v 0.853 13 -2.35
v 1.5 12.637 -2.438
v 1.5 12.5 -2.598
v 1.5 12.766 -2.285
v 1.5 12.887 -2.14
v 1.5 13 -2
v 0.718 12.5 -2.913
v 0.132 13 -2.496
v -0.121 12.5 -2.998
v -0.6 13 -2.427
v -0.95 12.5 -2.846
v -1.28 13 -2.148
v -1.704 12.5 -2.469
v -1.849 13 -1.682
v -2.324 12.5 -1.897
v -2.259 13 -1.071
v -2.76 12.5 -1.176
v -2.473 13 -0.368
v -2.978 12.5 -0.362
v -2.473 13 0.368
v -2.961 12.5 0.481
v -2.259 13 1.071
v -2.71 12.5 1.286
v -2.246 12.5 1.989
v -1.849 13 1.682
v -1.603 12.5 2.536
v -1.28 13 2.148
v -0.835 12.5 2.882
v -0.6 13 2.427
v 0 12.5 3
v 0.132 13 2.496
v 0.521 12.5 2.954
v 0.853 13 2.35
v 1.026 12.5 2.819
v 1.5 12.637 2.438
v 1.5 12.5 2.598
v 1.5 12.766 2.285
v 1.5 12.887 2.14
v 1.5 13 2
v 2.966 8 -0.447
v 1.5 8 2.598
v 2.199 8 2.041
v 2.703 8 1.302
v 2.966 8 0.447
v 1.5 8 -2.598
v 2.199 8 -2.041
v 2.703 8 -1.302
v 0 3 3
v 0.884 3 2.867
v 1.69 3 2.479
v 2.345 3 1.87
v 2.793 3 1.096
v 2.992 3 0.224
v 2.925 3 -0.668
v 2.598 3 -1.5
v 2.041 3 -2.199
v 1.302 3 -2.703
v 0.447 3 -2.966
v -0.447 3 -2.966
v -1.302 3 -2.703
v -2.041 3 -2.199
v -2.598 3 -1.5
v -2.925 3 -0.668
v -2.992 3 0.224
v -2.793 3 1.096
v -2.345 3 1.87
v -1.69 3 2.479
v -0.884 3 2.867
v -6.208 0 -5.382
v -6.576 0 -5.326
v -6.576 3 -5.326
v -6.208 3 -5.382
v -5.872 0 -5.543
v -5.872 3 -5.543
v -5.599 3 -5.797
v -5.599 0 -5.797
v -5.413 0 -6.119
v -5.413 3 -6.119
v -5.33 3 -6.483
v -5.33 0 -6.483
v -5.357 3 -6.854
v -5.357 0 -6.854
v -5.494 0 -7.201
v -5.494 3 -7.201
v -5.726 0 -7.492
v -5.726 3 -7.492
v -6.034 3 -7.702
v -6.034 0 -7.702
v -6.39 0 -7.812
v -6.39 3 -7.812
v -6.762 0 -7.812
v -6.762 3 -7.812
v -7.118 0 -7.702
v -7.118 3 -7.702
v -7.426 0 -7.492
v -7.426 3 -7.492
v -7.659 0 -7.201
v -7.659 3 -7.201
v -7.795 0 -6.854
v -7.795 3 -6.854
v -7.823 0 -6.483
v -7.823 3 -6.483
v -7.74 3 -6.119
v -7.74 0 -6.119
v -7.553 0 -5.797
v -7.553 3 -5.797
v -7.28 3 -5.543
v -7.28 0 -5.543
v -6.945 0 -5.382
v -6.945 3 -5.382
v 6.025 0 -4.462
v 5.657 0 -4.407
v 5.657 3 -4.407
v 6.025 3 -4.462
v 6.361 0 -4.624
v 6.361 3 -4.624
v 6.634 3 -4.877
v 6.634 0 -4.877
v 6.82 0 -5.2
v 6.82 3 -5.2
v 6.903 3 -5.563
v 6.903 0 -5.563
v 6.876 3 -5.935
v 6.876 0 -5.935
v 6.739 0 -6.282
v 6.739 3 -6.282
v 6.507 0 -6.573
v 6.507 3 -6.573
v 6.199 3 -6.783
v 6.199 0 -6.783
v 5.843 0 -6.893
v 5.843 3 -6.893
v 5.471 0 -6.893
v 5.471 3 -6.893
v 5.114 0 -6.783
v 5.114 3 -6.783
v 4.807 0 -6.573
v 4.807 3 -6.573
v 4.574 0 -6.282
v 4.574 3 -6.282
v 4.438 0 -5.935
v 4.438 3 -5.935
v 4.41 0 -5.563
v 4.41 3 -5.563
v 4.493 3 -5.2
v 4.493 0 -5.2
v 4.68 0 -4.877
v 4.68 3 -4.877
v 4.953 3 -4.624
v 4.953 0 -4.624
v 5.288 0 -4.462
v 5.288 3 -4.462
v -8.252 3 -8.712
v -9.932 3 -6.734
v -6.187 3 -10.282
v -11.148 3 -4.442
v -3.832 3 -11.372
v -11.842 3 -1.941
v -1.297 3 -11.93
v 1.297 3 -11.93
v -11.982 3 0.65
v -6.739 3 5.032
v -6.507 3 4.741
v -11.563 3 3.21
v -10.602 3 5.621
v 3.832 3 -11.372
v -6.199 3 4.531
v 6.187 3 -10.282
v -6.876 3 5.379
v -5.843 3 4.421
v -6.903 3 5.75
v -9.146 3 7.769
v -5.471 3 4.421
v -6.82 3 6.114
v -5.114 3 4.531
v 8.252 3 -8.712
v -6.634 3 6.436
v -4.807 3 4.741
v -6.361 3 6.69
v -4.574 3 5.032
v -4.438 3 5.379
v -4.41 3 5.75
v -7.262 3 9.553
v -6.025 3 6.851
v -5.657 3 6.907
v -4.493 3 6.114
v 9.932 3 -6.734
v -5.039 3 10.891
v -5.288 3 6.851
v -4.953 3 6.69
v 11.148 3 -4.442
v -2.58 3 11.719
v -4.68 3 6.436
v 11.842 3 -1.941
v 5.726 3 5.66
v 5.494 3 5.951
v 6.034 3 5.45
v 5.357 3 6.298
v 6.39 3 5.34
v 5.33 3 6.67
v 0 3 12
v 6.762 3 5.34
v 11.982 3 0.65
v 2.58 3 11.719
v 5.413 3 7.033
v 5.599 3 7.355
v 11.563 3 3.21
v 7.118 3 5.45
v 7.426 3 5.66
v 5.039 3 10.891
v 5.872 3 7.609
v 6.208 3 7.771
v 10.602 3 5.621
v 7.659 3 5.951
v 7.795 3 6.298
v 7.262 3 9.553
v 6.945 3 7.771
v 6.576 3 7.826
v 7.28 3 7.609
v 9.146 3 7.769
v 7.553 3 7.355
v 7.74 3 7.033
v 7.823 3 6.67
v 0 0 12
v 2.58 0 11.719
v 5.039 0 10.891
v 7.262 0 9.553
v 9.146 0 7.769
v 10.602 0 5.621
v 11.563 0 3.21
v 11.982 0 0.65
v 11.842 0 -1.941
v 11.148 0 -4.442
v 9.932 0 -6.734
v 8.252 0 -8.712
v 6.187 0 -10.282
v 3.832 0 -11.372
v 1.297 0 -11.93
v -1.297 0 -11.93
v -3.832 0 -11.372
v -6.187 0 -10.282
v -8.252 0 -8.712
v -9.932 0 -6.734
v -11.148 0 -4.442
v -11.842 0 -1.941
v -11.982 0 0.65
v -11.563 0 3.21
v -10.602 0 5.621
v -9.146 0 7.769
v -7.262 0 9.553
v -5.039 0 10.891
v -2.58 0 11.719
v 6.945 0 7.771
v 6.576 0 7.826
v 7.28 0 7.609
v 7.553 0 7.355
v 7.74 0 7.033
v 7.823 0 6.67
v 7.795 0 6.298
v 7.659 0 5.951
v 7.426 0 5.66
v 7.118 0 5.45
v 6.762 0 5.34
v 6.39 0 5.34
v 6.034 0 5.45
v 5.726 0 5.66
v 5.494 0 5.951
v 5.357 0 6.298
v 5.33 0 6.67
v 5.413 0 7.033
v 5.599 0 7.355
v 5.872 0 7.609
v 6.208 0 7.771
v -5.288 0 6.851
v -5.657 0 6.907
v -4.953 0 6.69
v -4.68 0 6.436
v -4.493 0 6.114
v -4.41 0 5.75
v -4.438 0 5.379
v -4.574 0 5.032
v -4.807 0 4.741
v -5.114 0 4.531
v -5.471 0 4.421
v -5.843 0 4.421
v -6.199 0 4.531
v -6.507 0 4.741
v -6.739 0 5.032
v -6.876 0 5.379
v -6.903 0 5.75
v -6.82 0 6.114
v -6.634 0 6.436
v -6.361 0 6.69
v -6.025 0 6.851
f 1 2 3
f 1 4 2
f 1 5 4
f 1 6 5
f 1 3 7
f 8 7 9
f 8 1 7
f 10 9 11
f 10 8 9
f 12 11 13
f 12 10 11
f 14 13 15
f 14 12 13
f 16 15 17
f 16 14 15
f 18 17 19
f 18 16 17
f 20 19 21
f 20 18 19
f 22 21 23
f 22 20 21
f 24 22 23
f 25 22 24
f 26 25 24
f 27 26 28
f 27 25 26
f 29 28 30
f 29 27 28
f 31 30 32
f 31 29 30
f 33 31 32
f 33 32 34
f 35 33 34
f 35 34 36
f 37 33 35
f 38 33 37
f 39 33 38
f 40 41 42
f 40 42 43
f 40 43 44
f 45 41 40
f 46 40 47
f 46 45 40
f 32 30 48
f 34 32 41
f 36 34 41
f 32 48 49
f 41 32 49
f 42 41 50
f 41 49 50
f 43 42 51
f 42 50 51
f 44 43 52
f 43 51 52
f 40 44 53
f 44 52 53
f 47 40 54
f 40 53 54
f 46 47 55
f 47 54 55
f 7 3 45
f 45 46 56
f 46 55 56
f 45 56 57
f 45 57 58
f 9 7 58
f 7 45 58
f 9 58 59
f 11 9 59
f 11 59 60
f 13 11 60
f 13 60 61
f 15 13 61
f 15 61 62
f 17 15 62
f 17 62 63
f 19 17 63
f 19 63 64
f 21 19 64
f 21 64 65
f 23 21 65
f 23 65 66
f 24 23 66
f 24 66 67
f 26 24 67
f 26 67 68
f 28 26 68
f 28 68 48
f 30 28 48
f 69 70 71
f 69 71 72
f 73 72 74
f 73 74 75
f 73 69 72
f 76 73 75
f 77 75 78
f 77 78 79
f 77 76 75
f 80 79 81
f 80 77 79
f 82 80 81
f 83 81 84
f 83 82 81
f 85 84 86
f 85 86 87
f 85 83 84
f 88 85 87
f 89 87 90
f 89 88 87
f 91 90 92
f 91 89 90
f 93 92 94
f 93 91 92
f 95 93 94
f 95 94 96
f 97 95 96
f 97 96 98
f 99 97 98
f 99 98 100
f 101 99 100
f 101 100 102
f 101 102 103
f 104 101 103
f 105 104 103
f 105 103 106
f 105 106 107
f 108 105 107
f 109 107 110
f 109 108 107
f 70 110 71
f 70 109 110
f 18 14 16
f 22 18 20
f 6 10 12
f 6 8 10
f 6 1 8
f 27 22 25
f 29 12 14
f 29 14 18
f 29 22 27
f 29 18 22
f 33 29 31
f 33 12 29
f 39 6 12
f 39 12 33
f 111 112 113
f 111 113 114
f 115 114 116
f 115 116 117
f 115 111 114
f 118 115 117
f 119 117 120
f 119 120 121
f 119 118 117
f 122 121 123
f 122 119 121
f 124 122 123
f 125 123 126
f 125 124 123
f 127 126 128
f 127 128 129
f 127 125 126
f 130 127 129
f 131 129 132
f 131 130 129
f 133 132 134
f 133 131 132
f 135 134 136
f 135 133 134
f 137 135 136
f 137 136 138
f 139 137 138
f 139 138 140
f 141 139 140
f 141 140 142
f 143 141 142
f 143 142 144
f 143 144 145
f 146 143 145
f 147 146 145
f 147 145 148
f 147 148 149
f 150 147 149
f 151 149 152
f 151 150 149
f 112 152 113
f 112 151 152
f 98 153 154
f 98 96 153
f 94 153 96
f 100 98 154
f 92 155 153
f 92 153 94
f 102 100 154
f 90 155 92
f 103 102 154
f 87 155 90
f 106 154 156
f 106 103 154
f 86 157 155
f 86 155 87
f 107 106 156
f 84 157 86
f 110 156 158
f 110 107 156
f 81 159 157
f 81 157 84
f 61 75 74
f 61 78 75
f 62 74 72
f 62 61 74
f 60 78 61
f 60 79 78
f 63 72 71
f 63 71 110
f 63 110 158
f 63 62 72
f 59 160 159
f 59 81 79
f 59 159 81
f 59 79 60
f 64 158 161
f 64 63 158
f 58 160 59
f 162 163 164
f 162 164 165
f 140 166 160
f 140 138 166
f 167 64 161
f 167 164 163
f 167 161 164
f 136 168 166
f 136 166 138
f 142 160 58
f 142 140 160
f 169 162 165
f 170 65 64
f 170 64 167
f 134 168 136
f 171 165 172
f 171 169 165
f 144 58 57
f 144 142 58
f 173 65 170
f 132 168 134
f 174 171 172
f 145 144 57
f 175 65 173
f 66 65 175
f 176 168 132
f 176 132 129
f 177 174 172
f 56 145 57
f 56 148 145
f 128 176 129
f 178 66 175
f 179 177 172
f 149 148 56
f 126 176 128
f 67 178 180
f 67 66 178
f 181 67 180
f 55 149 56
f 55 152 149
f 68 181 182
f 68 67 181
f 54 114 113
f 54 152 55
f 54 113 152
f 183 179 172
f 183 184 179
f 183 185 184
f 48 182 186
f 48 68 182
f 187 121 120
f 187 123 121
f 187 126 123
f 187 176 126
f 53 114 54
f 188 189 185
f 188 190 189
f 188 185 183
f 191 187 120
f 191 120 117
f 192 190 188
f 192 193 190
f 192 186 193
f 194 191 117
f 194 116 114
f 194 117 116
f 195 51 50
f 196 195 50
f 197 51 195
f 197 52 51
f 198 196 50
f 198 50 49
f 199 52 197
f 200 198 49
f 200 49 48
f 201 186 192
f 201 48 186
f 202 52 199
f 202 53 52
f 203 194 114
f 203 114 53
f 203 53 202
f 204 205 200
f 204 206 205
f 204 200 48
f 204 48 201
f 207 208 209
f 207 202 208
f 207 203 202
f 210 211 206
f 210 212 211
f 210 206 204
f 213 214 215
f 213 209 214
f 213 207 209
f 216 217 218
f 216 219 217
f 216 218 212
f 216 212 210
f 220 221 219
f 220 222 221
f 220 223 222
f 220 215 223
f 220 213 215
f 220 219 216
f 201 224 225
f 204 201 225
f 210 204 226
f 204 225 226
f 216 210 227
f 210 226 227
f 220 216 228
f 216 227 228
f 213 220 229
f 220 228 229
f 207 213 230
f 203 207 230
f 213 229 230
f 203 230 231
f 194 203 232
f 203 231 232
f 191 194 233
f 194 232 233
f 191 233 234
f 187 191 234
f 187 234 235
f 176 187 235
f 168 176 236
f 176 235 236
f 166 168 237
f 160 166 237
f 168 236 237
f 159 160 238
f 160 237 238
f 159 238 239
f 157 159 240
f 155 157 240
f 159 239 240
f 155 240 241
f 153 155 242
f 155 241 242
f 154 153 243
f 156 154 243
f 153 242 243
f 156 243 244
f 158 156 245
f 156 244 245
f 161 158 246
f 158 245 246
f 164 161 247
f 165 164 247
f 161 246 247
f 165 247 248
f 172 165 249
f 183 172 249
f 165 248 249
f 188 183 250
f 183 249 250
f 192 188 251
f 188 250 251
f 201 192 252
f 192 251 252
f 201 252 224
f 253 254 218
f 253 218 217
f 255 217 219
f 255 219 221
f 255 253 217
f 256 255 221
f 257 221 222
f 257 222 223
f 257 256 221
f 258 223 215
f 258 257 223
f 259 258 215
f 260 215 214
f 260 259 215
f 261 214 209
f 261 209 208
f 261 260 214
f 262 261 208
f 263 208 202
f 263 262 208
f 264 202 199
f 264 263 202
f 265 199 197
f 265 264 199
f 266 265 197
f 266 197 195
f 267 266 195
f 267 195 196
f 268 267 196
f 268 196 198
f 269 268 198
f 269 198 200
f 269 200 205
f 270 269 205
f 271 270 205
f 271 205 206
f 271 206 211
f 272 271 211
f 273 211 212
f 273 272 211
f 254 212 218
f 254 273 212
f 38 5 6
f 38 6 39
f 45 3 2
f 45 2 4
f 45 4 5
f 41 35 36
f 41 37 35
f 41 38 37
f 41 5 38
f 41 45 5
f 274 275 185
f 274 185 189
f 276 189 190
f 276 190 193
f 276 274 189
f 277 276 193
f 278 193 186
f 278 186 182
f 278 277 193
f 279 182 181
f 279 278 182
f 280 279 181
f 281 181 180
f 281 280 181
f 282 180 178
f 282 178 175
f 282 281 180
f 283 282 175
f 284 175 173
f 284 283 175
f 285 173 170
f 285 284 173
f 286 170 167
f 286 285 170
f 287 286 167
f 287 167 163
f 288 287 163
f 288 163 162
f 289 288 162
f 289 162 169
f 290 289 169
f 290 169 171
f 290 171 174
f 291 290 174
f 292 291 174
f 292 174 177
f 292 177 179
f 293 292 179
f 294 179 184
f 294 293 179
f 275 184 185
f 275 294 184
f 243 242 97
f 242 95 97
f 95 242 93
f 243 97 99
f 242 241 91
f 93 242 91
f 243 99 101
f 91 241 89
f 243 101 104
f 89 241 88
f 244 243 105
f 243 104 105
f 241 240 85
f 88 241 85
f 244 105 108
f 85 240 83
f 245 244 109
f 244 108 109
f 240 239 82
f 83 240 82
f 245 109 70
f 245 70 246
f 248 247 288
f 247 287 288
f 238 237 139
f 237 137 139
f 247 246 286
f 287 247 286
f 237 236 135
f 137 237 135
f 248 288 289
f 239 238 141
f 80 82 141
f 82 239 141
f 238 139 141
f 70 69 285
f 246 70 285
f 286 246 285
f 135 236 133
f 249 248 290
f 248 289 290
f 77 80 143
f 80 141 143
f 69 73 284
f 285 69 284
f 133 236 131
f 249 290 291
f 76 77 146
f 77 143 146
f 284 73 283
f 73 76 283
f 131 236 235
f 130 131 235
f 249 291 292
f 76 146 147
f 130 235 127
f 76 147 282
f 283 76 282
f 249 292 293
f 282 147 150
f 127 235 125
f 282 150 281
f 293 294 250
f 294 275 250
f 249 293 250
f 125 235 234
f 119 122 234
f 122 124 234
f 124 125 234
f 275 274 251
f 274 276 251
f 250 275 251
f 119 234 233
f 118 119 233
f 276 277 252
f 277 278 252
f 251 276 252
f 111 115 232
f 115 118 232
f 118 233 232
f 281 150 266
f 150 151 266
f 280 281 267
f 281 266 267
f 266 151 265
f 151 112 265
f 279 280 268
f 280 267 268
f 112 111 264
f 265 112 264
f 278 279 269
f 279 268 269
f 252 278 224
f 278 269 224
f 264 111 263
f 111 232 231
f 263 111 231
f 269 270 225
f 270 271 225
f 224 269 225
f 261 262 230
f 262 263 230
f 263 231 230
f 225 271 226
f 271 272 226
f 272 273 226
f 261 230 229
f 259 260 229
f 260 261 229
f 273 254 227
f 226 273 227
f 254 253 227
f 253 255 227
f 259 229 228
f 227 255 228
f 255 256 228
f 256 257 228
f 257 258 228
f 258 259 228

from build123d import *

# Parameters (mm, degrees)
CROQUIS1_R              = 12
CROQUIS1_R_2            = 1.25
SALIENTE_EXTRUIR1_DEPTH = 3
SALIENTE_EXTRUIR2_START = 3
CROQUIS1_3_R            = 3
SALIENTE_EXTRUIR2_DEPTH = 10
CORTAR_EXTRUIR1_START   = -5
CORTAR_EXTRUIR1_DEPTH   = 5
CHAFL_N1_SIZE           = 0.5


with BuildPart() as part:
    # Croquis1 → Saliente-Extruir1 (new body)
    with BuildSketch(Plane(origin=(0, 0, 0), x_dir=(1, 0, 0), z_dir=(0, 1, 0))):
        with Locations(Location((0, 0, 0), (0, 0, 270))):
            Circle(CROQUIS1_R)
        with Locations(Location((-6.576093065, 6.576093065, 0), (0, 0, 270))):
            Circle(CROQUIS1_R_2, mode=Mode.SUBTRACT)
        with Locations(Location((5.656854249, 5.656854249, 0), (0, 0, 270))):
            Circle(CROQUIS1_R_2, mode=Mode.SUBTRACT)
        with Locations(Location((6.576093065, -6.576093065, 0), (0, 0, 270))):
            Circle(CROQUIS1_R_2, mode=Mode.SUBTRACT)
        with Locations(Location((-5.656854249, -5.656854249, 0), (0, 0, 270))):
            Circle(CROQUIS1_R_2, mode=Mode.SUBTRACT)
    extrude(amount=SALIENTE_EXTRUIR1_DEPTH)

    # Croquis1<3> → Saliente-Extruir2 (add)
    with BuildSketch(Plane(origin=(0, 0, 0), x_dir=(1, 0, 0), z_dir=(0, 1, 0)).offset(SALIENTE_EXTRUIR2_START)):
        with Locations(Location((0, 0, 0), (0, 0, 270))):
            Circle(CROQUIS1_3_R)
    extrude(amount=SALIENTE_EXTRUIR2_DEPTH)

    # Croquis2 → Cortar-Extruir1 (cut)
    with BuildSketch(Plane(origin=(0, 13, 0), x_dir=(1, 0, 0), z_dir=(0, 1, 0)).offset(CORTAR_EXTRUIR1_START)):
        with BuildLine():
            Line((1.5, 2.598076211), (1.5, -2.598076211))
            ThreePointArc((1.5, -2.598076211), (3, 0), (1.5, 2.598076211))
        make_face()
    extrude(amount=CORTAR_EXTRUIR1_DEPTH, mode=Mode.SUBTRACT)

    # Chaflán1
    chafl_n1_edges = [part.edges().sort_by_distance(p)[0] for p in [
        (-2.897777479, 13, -0.776457135),
    ]]
    chamfer(chafl_n1_edges, length=CHAFL_N1_SIZE)


solid = part.part
